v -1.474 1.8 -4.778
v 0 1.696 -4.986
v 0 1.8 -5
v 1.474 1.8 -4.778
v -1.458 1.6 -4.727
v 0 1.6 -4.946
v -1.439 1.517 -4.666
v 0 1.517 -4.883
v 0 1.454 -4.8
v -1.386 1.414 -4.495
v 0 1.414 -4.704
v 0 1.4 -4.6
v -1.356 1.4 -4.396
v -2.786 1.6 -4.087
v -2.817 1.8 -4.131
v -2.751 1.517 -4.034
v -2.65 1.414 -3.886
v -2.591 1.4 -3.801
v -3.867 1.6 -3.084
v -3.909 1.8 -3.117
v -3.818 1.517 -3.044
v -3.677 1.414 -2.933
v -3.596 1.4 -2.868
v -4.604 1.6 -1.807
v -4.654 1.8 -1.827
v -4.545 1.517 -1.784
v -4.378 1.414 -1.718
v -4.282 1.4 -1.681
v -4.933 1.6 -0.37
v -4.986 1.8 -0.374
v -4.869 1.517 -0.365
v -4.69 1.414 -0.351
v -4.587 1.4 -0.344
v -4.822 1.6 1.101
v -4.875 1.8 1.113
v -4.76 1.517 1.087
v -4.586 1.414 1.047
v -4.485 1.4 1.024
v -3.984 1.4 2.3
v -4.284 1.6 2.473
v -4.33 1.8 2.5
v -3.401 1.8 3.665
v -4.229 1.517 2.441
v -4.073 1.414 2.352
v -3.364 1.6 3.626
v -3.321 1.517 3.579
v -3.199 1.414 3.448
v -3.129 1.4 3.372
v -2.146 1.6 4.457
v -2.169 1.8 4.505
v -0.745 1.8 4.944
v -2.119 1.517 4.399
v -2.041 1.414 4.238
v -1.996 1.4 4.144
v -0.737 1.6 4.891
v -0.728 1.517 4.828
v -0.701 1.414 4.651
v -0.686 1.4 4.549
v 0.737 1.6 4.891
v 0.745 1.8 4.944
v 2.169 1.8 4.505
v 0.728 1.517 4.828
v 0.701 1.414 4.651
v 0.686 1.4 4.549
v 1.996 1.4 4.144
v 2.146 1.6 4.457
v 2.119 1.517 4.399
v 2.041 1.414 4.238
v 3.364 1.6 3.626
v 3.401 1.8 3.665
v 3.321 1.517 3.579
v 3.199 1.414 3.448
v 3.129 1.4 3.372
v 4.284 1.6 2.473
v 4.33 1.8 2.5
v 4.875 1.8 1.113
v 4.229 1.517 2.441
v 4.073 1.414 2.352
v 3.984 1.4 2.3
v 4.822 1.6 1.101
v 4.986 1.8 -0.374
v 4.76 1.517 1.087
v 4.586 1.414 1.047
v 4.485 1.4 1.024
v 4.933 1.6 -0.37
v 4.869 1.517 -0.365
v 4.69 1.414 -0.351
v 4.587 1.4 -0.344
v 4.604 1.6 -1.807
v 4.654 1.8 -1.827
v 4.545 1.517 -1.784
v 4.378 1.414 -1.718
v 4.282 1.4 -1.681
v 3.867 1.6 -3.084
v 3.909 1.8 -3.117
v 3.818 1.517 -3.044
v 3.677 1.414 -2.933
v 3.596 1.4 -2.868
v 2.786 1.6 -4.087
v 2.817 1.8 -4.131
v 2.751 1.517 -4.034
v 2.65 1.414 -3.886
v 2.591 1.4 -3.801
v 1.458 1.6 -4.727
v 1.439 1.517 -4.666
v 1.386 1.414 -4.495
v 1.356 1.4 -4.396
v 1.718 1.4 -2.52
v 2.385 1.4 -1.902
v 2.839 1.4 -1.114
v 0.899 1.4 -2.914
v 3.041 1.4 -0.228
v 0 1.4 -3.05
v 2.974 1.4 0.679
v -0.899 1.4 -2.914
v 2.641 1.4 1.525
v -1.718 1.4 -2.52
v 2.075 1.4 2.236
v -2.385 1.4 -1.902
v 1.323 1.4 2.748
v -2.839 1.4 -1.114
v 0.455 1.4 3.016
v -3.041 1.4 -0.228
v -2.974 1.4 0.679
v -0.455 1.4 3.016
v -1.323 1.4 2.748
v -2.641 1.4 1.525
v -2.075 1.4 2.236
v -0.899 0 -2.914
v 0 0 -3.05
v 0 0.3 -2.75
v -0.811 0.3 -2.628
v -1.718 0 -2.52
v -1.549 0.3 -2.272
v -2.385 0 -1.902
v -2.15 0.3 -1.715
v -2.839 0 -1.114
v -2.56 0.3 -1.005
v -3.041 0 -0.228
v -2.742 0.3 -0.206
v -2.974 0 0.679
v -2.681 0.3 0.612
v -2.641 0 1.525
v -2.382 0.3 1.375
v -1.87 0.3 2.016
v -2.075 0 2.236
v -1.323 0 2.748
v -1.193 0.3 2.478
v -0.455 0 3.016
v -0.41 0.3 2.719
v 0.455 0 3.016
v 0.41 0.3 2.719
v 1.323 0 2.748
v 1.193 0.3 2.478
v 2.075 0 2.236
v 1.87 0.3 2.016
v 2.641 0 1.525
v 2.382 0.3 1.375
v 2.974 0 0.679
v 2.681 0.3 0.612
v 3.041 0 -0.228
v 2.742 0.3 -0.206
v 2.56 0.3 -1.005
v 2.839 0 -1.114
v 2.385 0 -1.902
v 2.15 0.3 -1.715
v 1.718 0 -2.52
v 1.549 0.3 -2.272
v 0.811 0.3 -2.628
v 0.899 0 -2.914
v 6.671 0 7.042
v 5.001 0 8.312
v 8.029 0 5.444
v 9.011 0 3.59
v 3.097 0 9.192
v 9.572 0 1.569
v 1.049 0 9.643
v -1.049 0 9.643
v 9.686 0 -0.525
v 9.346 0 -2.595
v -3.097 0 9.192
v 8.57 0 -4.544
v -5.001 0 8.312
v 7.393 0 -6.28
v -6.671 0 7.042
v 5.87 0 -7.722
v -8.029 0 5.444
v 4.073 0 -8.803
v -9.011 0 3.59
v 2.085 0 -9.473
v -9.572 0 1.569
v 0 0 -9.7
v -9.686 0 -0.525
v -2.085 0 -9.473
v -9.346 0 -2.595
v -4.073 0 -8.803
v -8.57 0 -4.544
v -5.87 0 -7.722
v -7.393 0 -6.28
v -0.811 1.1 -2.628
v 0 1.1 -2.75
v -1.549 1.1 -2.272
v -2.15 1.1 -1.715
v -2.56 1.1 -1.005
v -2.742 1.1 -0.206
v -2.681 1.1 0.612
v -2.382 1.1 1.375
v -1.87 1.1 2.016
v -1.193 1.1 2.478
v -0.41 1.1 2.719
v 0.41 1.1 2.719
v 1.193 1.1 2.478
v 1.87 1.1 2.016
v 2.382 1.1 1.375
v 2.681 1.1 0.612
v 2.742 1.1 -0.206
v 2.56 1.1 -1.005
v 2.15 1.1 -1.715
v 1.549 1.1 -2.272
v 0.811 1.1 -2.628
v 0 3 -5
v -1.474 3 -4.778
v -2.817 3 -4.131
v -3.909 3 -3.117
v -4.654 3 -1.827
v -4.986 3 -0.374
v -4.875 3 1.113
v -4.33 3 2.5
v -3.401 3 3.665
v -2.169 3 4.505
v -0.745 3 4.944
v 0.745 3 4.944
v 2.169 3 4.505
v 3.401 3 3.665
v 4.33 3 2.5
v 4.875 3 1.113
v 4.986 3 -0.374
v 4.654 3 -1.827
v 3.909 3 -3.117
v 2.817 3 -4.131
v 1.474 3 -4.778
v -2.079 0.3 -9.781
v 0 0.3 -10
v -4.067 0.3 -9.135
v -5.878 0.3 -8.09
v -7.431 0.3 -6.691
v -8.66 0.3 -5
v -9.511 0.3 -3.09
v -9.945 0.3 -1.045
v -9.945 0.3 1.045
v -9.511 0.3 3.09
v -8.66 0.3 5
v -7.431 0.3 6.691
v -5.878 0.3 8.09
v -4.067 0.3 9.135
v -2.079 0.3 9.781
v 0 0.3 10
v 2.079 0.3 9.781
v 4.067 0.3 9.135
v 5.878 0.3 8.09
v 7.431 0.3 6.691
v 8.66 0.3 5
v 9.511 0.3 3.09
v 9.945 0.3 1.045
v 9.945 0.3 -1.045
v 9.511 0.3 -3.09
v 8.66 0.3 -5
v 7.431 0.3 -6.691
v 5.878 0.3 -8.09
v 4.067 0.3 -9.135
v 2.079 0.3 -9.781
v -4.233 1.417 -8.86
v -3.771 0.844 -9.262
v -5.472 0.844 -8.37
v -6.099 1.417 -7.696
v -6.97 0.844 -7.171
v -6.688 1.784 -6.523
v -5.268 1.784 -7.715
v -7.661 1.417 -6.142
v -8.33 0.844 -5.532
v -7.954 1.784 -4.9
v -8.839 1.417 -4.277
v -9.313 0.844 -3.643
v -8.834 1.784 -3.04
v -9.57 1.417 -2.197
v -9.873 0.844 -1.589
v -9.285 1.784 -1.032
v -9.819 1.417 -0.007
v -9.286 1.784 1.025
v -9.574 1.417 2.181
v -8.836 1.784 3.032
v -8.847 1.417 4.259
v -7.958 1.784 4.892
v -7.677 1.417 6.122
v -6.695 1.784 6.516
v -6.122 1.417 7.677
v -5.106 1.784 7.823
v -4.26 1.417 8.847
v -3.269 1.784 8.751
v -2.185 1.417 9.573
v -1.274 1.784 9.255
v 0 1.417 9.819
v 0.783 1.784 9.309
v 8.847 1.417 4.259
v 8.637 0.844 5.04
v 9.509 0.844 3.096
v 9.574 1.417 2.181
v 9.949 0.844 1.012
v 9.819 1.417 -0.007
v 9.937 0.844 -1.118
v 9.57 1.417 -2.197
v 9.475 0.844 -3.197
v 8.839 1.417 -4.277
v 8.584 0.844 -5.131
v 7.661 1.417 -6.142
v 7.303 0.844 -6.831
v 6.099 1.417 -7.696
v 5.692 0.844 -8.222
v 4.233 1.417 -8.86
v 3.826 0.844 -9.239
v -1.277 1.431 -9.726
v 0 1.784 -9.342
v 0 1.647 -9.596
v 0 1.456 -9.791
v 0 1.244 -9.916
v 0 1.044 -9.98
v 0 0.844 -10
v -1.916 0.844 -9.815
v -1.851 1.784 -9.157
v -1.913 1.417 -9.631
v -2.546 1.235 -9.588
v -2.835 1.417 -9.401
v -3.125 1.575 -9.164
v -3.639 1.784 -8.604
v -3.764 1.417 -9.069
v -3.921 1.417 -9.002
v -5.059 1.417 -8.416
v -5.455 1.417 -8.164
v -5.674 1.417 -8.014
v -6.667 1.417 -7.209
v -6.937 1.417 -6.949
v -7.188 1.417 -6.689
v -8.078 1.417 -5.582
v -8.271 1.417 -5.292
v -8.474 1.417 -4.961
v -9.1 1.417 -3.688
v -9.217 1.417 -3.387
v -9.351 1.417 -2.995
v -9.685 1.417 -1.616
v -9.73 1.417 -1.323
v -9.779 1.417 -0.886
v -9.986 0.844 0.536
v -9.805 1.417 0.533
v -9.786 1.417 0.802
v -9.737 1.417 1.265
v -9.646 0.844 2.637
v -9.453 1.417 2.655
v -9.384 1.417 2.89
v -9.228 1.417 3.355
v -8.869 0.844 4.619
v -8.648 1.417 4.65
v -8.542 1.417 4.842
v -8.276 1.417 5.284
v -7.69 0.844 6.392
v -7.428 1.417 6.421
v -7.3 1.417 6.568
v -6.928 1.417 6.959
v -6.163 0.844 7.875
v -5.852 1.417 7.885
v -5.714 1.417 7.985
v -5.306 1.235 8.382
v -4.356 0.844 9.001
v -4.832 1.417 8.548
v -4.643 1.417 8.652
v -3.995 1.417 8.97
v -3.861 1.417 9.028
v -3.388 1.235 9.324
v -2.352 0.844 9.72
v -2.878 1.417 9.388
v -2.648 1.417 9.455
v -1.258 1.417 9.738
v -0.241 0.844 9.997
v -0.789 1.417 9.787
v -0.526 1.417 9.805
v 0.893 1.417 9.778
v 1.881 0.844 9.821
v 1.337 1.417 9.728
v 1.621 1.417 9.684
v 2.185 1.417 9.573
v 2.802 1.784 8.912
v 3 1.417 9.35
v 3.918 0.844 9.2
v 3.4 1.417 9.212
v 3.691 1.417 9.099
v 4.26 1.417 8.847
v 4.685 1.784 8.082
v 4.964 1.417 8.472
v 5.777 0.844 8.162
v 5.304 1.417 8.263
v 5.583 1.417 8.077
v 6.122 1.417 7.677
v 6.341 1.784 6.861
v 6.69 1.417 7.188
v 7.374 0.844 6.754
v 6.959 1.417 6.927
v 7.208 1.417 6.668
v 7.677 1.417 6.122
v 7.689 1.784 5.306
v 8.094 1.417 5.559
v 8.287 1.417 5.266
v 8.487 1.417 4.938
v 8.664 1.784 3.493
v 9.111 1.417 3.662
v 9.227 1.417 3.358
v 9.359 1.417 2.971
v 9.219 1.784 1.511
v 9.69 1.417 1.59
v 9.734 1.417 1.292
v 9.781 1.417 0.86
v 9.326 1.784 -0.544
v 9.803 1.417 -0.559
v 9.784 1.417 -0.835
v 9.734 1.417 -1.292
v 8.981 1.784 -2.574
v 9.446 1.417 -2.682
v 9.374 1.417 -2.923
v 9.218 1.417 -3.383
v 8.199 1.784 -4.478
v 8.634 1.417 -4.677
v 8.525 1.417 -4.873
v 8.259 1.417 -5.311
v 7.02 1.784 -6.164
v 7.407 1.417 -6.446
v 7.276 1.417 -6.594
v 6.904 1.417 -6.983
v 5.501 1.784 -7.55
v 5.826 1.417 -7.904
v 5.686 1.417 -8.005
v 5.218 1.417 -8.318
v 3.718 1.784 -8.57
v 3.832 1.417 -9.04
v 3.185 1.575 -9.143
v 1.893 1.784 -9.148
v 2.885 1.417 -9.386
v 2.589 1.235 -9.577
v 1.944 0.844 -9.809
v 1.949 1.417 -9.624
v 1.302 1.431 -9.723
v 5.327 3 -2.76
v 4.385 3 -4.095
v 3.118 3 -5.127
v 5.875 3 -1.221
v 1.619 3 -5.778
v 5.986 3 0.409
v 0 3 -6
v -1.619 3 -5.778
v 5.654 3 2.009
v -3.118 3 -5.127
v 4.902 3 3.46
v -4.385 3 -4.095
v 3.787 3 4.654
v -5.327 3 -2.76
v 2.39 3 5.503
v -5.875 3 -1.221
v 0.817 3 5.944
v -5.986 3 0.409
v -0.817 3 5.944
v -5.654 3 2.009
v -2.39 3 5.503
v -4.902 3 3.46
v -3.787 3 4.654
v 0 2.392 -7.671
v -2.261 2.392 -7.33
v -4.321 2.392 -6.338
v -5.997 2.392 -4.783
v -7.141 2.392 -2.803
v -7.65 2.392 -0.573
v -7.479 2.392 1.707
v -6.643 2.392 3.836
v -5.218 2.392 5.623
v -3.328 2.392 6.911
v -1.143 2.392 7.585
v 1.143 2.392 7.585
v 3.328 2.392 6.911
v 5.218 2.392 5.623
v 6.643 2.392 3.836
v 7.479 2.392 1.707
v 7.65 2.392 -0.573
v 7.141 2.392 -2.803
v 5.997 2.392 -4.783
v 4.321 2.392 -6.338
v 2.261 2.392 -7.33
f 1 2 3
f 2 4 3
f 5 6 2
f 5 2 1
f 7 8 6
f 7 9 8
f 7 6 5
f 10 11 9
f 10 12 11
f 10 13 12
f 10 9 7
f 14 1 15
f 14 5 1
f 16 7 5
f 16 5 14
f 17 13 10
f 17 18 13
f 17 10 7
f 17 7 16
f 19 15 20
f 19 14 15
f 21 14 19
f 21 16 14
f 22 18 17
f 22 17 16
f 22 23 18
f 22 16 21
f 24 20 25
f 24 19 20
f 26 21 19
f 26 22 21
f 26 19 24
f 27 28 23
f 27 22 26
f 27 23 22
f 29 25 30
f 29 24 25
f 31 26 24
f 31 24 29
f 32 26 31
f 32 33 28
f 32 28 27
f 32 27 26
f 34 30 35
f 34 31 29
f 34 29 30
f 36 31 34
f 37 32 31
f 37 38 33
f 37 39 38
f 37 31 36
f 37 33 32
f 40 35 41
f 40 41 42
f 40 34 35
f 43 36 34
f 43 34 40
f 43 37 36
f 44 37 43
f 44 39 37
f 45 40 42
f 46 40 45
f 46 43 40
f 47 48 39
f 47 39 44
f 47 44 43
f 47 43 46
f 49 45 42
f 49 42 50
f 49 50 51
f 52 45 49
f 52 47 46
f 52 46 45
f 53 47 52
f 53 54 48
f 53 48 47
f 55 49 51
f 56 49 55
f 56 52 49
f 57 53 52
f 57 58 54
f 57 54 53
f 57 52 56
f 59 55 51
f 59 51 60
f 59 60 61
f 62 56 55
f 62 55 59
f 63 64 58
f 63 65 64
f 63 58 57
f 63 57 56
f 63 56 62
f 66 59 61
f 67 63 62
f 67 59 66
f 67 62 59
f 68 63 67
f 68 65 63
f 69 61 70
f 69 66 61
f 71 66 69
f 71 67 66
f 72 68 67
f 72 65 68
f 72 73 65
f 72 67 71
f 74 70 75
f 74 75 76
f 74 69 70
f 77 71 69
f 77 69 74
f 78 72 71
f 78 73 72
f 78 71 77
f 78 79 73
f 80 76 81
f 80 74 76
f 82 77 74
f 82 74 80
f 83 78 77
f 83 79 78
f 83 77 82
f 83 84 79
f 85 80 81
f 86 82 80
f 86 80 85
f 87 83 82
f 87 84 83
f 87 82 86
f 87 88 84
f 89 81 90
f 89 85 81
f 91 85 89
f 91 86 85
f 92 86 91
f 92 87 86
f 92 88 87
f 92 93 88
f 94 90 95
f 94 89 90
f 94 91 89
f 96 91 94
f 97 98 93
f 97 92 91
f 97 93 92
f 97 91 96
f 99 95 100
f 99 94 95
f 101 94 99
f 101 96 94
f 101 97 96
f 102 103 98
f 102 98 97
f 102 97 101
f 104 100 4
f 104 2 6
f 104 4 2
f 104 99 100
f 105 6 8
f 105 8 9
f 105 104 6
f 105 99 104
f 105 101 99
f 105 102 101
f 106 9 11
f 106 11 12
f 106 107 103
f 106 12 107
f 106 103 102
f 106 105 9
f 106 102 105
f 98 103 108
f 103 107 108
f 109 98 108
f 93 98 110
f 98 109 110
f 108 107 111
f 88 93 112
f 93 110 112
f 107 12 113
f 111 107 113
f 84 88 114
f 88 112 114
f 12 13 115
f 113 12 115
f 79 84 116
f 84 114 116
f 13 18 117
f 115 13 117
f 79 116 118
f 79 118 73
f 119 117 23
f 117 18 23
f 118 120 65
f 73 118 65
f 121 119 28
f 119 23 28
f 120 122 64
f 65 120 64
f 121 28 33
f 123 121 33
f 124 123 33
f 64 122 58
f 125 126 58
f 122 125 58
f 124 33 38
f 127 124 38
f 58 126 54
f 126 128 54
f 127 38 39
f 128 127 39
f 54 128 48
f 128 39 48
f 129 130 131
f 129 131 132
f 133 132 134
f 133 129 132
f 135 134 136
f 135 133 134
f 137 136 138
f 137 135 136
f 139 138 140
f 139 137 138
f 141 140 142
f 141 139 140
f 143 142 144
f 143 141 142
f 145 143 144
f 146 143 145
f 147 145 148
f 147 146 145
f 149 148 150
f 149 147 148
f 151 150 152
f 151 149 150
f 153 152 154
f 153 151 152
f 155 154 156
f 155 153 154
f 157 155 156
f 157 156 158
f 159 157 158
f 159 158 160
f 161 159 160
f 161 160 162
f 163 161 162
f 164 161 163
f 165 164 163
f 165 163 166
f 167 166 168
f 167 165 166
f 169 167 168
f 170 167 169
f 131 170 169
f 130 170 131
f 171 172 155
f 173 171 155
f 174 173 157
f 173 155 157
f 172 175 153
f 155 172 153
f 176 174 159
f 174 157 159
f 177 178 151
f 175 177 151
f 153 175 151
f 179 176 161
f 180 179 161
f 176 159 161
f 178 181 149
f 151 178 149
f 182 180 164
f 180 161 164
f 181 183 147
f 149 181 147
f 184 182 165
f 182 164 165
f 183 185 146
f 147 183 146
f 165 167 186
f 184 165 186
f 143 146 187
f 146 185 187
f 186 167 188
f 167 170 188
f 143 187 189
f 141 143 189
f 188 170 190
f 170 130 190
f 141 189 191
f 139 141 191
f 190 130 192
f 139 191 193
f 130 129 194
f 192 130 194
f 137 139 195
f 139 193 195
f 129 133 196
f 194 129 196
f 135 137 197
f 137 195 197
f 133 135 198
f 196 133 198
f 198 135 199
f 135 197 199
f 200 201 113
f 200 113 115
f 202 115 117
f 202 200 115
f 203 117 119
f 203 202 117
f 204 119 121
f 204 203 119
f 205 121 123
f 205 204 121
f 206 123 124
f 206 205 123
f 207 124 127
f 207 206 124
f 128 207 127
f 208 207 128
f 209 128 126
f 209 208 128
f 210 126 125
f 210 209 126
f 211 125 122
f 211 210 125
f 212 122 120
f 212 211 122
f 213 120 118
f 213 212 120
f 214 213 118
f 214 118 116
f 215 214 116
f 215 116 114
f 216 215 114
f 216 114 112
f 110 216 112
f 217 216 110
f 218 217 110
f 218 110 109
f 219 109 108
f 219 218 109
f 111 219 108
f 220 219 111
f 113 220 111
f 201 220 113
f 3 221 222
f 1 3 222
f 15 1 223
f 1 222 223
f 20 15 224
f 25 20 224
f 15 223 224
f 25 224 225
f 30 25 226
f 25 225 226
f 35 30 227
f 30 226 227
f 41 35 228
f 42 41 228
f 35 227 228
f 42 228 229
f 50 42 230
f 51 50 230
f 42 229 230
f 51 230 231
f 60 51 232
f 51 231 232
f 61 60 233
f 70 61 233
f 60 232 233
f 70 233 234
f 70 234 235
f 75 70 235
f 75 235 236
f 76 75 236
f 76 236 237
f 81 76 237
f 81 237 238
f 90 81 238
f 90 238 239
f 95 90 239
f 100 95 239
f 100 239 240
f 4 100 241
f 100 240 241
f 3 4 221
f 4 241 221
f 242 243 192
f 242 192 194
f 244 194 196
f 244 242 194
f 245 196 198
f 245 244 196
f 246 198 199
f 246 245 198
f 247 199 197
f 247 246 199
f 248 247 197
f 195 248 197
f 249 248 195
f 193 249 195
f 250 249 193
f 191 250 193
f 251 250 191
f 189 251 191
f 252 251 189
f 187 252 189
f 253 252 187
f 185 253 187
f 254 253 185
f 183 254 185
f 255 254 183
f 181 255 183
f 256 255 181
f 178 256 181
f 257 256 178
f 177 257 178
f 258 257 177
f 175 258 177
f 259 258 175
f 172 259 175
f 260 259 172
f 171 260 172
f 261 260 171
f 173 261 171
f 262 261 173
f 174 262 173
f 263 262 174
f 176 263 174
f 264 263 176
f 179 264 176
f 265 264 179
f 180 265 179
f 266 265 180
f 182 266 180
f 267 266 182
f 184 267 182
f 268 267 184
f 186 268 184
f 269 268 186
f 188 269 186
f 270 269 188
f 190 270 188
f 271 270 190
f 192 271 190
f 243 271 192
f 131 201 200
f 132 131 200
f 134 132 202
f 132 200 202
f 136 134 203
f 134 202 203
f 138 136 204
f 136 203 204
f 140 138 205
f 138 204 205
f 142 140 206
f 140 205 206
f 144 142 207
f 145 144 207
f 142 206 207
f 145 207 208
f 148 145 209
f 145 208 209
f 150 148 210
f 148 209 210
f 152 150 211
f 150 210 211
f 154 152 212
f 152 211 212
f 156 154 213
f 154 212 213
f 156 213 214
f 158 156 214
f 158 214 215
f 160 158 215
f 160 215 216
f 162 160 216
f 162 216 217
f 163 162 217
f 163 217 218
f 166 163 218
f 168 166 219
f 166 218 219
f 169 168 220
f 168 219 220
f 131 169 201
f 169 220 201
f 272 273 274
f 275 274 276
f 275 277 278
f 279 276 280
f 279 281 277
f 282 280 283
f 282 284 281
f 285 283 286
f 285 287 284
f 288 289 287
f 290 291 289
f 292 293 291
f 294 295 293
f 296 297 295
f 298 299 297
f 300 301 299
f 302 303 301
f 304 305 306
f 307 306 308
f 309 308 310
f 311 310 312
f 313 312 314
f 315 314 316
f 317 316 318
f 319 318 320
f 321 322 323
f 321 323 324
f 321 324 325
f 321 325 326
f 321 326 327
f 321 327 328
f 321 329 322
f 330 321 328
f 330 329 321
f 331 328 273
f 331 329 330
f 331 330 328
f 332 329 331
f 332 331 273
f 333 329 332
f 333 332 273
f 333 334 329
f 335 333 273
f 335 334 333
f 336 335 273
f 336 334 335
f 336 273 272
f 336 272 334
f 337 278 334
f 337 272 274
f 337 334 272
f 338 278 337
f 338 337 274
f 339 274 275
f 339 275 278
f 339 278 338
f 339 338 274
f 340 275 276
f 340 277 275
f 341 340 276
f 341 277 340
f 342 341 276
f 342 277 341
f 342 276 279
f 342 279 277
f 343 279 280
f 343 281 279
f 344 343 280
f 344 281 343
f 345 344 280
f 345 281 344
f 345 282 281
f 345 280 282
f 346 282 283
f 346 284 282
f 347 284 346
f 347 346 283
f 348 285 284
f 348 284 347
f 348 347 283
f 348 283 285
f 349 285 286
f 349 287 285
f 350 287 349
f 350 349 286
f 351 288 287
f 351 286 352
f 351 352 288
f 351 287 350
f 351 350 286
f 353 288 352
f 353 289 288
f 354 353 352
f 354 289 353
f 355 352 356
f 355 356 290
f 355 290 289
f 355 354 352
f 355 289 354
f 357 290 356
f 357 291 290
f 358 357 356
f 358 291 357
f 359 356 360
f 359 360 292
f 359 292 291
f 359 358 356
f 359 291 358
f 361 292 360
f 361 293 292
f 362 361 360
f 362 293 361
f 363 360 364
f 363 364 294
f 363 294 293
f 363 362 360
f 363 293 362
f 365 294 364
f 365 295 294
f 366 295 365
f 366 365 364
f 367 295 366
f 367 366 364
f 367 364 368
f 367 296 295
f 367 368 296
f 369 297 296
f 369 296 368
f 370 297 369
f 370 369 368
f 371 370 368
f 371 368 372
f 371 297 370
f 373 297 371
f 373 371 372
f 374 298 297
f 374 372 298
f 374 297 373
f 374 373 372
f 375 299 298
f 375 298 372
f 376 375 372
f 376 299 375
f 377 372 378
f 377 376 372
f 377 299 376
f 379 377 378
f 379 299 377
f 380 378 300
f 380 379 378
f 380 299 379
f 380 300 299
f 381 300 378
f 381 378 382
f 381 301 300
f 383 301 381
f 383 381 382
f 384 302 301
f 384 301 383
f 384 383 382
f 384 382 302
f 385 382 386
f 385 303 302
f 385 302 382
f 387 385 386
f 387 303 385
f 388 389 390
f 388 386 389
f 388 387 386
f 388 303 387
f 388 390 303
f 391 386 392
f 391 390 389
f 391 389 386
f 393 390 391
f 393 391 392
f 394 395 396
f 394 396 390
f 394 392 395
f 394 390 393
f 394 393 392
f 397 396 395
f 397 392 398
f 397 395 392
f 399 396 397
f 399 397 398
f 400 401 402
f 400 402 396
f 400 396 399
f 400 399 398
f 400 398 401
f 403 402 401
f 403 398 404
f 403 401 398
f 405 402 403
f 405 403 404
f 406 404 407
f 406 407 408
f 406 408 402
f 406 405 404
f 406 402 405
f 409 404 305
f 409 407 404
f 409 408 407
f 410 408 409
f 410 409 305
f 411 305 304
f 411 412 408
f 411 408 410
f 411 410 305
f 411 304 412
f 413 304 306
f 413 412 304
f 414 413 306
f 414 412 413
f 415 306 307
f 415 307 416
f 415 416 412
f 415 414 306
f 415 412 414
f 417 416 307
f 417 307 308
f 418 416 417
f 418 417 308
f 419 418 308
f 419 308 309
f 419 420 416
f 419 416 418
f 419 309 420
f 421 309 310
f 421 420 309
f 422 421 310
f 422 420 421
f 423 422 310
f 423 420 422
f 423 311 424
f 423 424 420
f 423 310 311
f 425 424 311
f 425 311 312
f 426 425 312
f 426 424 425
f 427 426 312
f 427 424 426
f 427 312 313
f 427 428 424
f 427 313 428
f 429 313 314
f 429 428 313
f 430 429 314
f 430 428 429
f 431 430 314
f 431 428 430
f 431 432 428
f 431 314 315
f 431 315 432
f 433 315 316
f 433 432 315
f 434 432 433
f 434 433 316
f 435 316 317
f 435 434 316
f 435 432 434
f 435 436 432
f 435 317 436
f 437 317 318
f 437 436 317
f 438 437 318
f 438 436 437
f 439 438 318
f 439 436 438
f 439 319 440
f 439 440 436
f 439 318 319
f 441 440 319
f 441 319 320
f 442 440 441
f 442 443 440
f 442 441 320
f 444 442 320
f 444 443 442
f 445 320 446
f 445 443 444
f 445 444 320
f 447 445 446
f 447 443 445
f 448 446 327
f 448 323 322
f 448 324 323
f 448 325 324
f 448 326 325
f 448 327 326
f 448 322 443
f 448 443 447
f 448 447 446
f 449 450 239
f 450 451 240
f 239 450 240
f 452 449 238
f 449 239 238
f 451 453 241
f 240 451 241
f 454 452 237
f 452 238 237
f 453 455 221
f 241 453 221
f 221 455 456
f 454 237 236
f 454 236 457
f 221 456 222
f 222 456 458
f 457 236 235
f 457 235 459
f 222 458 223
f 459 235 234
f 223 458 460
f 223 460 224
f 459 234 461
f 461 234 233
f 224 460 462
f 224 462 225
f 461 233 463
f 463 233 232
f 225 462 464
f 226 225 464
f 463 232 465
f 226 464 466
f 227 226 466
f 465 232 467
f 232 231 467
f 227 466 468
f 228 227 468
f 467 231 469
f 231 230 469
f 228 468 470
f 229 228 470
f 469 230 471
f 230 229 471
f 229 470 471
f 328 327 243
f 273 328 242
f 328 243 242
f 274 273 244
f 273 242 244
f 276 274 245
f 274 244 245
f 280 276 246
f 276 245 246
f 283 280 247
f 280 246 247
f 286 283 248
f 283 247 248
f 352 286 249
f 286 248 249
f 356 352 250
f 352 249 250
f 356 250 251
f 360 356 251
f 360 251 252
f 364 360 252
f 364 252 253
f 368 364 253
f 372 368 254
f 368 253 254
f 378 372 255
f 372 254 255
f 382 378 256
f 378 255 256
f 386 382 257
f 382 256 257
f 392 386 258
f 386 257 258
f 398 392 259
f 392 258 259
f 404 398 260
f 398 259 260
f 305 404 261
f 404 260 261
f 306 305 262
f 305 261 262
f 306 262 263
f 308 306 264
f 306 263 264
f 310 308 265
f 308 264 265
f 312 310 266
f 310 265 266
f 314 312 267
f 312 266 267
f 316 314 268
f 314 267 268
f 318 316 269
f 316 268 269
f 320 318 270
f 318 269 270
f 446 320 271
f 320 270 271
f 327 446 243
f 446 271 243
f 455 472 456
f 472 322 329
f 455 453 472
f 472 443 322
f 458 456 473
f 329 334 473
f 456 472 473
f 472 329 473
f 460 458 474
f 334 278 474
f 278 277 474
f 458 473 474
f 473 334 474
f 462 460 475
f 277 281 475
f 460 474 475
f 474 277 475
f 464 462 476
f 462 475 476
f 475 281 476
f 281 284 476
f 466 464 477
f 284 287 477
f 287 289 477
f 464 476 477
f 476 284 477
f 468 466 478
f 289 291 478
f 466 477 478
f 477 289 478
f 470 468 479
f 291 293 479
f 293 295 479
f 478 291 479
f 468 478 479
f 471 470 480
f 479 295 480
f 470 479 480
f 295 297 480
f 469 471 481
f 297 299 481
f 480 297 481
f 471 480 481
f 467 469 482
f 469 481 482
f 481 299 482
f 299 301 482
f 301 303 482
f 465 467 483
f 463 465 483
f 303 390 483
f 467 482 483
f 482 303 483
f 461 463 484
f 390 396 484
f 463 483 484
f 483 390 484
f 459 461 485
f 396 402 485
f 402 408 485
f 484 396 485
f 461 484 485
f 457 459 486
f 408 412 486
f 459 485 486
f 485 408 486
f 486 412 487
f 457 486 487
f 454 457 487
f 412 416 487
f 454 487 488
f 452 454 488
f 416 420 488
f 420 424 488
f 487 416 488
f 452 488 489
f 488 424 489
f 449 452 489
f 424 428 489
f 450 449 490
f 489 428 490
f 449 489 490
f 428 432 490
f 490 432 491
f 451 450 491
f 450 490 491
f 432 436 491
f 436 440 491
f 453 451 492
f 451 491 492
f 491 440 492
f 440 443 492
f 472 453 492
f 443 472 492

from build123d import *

# Parameters (mm, degrees)
FILLET2_R     = 1
FILLET3_R     = 0.4
CHAMFER1_SIZE = 0.3


with BuildPart() as part:
    # Sketch1 → Revolve1 (revolve)
    with BuildSketch(Plane.XY, mode=Mode.PRIVATE) as revolve1_sk:
        Polygon((2.75, 0), (2.75, 1.4), (5, 1.4), (5, 3), (6, 3), (10, 1.544119063), (10, 0), align=None)
    revolve(revolve1_sk.sketch.rotate(Axis((0, 0, 0), (0, 1, 0)), 90), axis=Axis((0, 0, 0), (0, 1, 0)))

    # Fillet2
    fillet2_edges = [part.edges().sort_by_distance(p)[0] for p in [
        (0, 1.544119063, 10),
    ]]
    fillet(fillet2_edges, radius=FILLET2_R)

    # Fillet3
    fillet3_edges = [part.edges().sort_by_distance(p)[0] for p in [
        (0, 1.4, 5),
    ]]
    fillet(fillet3_edges, radius=FILLET3_R)

    # Chamfer1
    chamfer1_edges = [part.edges().sort_by_distance(p)[0] for p in [
        (0, 0, 10),
        (0, 1.4, 2.75),
        (0, 0, 2.75),
    ]]
    chamfer(chamfer1_edges, length=CHAMFER1_SIZE)


solid = part.part
